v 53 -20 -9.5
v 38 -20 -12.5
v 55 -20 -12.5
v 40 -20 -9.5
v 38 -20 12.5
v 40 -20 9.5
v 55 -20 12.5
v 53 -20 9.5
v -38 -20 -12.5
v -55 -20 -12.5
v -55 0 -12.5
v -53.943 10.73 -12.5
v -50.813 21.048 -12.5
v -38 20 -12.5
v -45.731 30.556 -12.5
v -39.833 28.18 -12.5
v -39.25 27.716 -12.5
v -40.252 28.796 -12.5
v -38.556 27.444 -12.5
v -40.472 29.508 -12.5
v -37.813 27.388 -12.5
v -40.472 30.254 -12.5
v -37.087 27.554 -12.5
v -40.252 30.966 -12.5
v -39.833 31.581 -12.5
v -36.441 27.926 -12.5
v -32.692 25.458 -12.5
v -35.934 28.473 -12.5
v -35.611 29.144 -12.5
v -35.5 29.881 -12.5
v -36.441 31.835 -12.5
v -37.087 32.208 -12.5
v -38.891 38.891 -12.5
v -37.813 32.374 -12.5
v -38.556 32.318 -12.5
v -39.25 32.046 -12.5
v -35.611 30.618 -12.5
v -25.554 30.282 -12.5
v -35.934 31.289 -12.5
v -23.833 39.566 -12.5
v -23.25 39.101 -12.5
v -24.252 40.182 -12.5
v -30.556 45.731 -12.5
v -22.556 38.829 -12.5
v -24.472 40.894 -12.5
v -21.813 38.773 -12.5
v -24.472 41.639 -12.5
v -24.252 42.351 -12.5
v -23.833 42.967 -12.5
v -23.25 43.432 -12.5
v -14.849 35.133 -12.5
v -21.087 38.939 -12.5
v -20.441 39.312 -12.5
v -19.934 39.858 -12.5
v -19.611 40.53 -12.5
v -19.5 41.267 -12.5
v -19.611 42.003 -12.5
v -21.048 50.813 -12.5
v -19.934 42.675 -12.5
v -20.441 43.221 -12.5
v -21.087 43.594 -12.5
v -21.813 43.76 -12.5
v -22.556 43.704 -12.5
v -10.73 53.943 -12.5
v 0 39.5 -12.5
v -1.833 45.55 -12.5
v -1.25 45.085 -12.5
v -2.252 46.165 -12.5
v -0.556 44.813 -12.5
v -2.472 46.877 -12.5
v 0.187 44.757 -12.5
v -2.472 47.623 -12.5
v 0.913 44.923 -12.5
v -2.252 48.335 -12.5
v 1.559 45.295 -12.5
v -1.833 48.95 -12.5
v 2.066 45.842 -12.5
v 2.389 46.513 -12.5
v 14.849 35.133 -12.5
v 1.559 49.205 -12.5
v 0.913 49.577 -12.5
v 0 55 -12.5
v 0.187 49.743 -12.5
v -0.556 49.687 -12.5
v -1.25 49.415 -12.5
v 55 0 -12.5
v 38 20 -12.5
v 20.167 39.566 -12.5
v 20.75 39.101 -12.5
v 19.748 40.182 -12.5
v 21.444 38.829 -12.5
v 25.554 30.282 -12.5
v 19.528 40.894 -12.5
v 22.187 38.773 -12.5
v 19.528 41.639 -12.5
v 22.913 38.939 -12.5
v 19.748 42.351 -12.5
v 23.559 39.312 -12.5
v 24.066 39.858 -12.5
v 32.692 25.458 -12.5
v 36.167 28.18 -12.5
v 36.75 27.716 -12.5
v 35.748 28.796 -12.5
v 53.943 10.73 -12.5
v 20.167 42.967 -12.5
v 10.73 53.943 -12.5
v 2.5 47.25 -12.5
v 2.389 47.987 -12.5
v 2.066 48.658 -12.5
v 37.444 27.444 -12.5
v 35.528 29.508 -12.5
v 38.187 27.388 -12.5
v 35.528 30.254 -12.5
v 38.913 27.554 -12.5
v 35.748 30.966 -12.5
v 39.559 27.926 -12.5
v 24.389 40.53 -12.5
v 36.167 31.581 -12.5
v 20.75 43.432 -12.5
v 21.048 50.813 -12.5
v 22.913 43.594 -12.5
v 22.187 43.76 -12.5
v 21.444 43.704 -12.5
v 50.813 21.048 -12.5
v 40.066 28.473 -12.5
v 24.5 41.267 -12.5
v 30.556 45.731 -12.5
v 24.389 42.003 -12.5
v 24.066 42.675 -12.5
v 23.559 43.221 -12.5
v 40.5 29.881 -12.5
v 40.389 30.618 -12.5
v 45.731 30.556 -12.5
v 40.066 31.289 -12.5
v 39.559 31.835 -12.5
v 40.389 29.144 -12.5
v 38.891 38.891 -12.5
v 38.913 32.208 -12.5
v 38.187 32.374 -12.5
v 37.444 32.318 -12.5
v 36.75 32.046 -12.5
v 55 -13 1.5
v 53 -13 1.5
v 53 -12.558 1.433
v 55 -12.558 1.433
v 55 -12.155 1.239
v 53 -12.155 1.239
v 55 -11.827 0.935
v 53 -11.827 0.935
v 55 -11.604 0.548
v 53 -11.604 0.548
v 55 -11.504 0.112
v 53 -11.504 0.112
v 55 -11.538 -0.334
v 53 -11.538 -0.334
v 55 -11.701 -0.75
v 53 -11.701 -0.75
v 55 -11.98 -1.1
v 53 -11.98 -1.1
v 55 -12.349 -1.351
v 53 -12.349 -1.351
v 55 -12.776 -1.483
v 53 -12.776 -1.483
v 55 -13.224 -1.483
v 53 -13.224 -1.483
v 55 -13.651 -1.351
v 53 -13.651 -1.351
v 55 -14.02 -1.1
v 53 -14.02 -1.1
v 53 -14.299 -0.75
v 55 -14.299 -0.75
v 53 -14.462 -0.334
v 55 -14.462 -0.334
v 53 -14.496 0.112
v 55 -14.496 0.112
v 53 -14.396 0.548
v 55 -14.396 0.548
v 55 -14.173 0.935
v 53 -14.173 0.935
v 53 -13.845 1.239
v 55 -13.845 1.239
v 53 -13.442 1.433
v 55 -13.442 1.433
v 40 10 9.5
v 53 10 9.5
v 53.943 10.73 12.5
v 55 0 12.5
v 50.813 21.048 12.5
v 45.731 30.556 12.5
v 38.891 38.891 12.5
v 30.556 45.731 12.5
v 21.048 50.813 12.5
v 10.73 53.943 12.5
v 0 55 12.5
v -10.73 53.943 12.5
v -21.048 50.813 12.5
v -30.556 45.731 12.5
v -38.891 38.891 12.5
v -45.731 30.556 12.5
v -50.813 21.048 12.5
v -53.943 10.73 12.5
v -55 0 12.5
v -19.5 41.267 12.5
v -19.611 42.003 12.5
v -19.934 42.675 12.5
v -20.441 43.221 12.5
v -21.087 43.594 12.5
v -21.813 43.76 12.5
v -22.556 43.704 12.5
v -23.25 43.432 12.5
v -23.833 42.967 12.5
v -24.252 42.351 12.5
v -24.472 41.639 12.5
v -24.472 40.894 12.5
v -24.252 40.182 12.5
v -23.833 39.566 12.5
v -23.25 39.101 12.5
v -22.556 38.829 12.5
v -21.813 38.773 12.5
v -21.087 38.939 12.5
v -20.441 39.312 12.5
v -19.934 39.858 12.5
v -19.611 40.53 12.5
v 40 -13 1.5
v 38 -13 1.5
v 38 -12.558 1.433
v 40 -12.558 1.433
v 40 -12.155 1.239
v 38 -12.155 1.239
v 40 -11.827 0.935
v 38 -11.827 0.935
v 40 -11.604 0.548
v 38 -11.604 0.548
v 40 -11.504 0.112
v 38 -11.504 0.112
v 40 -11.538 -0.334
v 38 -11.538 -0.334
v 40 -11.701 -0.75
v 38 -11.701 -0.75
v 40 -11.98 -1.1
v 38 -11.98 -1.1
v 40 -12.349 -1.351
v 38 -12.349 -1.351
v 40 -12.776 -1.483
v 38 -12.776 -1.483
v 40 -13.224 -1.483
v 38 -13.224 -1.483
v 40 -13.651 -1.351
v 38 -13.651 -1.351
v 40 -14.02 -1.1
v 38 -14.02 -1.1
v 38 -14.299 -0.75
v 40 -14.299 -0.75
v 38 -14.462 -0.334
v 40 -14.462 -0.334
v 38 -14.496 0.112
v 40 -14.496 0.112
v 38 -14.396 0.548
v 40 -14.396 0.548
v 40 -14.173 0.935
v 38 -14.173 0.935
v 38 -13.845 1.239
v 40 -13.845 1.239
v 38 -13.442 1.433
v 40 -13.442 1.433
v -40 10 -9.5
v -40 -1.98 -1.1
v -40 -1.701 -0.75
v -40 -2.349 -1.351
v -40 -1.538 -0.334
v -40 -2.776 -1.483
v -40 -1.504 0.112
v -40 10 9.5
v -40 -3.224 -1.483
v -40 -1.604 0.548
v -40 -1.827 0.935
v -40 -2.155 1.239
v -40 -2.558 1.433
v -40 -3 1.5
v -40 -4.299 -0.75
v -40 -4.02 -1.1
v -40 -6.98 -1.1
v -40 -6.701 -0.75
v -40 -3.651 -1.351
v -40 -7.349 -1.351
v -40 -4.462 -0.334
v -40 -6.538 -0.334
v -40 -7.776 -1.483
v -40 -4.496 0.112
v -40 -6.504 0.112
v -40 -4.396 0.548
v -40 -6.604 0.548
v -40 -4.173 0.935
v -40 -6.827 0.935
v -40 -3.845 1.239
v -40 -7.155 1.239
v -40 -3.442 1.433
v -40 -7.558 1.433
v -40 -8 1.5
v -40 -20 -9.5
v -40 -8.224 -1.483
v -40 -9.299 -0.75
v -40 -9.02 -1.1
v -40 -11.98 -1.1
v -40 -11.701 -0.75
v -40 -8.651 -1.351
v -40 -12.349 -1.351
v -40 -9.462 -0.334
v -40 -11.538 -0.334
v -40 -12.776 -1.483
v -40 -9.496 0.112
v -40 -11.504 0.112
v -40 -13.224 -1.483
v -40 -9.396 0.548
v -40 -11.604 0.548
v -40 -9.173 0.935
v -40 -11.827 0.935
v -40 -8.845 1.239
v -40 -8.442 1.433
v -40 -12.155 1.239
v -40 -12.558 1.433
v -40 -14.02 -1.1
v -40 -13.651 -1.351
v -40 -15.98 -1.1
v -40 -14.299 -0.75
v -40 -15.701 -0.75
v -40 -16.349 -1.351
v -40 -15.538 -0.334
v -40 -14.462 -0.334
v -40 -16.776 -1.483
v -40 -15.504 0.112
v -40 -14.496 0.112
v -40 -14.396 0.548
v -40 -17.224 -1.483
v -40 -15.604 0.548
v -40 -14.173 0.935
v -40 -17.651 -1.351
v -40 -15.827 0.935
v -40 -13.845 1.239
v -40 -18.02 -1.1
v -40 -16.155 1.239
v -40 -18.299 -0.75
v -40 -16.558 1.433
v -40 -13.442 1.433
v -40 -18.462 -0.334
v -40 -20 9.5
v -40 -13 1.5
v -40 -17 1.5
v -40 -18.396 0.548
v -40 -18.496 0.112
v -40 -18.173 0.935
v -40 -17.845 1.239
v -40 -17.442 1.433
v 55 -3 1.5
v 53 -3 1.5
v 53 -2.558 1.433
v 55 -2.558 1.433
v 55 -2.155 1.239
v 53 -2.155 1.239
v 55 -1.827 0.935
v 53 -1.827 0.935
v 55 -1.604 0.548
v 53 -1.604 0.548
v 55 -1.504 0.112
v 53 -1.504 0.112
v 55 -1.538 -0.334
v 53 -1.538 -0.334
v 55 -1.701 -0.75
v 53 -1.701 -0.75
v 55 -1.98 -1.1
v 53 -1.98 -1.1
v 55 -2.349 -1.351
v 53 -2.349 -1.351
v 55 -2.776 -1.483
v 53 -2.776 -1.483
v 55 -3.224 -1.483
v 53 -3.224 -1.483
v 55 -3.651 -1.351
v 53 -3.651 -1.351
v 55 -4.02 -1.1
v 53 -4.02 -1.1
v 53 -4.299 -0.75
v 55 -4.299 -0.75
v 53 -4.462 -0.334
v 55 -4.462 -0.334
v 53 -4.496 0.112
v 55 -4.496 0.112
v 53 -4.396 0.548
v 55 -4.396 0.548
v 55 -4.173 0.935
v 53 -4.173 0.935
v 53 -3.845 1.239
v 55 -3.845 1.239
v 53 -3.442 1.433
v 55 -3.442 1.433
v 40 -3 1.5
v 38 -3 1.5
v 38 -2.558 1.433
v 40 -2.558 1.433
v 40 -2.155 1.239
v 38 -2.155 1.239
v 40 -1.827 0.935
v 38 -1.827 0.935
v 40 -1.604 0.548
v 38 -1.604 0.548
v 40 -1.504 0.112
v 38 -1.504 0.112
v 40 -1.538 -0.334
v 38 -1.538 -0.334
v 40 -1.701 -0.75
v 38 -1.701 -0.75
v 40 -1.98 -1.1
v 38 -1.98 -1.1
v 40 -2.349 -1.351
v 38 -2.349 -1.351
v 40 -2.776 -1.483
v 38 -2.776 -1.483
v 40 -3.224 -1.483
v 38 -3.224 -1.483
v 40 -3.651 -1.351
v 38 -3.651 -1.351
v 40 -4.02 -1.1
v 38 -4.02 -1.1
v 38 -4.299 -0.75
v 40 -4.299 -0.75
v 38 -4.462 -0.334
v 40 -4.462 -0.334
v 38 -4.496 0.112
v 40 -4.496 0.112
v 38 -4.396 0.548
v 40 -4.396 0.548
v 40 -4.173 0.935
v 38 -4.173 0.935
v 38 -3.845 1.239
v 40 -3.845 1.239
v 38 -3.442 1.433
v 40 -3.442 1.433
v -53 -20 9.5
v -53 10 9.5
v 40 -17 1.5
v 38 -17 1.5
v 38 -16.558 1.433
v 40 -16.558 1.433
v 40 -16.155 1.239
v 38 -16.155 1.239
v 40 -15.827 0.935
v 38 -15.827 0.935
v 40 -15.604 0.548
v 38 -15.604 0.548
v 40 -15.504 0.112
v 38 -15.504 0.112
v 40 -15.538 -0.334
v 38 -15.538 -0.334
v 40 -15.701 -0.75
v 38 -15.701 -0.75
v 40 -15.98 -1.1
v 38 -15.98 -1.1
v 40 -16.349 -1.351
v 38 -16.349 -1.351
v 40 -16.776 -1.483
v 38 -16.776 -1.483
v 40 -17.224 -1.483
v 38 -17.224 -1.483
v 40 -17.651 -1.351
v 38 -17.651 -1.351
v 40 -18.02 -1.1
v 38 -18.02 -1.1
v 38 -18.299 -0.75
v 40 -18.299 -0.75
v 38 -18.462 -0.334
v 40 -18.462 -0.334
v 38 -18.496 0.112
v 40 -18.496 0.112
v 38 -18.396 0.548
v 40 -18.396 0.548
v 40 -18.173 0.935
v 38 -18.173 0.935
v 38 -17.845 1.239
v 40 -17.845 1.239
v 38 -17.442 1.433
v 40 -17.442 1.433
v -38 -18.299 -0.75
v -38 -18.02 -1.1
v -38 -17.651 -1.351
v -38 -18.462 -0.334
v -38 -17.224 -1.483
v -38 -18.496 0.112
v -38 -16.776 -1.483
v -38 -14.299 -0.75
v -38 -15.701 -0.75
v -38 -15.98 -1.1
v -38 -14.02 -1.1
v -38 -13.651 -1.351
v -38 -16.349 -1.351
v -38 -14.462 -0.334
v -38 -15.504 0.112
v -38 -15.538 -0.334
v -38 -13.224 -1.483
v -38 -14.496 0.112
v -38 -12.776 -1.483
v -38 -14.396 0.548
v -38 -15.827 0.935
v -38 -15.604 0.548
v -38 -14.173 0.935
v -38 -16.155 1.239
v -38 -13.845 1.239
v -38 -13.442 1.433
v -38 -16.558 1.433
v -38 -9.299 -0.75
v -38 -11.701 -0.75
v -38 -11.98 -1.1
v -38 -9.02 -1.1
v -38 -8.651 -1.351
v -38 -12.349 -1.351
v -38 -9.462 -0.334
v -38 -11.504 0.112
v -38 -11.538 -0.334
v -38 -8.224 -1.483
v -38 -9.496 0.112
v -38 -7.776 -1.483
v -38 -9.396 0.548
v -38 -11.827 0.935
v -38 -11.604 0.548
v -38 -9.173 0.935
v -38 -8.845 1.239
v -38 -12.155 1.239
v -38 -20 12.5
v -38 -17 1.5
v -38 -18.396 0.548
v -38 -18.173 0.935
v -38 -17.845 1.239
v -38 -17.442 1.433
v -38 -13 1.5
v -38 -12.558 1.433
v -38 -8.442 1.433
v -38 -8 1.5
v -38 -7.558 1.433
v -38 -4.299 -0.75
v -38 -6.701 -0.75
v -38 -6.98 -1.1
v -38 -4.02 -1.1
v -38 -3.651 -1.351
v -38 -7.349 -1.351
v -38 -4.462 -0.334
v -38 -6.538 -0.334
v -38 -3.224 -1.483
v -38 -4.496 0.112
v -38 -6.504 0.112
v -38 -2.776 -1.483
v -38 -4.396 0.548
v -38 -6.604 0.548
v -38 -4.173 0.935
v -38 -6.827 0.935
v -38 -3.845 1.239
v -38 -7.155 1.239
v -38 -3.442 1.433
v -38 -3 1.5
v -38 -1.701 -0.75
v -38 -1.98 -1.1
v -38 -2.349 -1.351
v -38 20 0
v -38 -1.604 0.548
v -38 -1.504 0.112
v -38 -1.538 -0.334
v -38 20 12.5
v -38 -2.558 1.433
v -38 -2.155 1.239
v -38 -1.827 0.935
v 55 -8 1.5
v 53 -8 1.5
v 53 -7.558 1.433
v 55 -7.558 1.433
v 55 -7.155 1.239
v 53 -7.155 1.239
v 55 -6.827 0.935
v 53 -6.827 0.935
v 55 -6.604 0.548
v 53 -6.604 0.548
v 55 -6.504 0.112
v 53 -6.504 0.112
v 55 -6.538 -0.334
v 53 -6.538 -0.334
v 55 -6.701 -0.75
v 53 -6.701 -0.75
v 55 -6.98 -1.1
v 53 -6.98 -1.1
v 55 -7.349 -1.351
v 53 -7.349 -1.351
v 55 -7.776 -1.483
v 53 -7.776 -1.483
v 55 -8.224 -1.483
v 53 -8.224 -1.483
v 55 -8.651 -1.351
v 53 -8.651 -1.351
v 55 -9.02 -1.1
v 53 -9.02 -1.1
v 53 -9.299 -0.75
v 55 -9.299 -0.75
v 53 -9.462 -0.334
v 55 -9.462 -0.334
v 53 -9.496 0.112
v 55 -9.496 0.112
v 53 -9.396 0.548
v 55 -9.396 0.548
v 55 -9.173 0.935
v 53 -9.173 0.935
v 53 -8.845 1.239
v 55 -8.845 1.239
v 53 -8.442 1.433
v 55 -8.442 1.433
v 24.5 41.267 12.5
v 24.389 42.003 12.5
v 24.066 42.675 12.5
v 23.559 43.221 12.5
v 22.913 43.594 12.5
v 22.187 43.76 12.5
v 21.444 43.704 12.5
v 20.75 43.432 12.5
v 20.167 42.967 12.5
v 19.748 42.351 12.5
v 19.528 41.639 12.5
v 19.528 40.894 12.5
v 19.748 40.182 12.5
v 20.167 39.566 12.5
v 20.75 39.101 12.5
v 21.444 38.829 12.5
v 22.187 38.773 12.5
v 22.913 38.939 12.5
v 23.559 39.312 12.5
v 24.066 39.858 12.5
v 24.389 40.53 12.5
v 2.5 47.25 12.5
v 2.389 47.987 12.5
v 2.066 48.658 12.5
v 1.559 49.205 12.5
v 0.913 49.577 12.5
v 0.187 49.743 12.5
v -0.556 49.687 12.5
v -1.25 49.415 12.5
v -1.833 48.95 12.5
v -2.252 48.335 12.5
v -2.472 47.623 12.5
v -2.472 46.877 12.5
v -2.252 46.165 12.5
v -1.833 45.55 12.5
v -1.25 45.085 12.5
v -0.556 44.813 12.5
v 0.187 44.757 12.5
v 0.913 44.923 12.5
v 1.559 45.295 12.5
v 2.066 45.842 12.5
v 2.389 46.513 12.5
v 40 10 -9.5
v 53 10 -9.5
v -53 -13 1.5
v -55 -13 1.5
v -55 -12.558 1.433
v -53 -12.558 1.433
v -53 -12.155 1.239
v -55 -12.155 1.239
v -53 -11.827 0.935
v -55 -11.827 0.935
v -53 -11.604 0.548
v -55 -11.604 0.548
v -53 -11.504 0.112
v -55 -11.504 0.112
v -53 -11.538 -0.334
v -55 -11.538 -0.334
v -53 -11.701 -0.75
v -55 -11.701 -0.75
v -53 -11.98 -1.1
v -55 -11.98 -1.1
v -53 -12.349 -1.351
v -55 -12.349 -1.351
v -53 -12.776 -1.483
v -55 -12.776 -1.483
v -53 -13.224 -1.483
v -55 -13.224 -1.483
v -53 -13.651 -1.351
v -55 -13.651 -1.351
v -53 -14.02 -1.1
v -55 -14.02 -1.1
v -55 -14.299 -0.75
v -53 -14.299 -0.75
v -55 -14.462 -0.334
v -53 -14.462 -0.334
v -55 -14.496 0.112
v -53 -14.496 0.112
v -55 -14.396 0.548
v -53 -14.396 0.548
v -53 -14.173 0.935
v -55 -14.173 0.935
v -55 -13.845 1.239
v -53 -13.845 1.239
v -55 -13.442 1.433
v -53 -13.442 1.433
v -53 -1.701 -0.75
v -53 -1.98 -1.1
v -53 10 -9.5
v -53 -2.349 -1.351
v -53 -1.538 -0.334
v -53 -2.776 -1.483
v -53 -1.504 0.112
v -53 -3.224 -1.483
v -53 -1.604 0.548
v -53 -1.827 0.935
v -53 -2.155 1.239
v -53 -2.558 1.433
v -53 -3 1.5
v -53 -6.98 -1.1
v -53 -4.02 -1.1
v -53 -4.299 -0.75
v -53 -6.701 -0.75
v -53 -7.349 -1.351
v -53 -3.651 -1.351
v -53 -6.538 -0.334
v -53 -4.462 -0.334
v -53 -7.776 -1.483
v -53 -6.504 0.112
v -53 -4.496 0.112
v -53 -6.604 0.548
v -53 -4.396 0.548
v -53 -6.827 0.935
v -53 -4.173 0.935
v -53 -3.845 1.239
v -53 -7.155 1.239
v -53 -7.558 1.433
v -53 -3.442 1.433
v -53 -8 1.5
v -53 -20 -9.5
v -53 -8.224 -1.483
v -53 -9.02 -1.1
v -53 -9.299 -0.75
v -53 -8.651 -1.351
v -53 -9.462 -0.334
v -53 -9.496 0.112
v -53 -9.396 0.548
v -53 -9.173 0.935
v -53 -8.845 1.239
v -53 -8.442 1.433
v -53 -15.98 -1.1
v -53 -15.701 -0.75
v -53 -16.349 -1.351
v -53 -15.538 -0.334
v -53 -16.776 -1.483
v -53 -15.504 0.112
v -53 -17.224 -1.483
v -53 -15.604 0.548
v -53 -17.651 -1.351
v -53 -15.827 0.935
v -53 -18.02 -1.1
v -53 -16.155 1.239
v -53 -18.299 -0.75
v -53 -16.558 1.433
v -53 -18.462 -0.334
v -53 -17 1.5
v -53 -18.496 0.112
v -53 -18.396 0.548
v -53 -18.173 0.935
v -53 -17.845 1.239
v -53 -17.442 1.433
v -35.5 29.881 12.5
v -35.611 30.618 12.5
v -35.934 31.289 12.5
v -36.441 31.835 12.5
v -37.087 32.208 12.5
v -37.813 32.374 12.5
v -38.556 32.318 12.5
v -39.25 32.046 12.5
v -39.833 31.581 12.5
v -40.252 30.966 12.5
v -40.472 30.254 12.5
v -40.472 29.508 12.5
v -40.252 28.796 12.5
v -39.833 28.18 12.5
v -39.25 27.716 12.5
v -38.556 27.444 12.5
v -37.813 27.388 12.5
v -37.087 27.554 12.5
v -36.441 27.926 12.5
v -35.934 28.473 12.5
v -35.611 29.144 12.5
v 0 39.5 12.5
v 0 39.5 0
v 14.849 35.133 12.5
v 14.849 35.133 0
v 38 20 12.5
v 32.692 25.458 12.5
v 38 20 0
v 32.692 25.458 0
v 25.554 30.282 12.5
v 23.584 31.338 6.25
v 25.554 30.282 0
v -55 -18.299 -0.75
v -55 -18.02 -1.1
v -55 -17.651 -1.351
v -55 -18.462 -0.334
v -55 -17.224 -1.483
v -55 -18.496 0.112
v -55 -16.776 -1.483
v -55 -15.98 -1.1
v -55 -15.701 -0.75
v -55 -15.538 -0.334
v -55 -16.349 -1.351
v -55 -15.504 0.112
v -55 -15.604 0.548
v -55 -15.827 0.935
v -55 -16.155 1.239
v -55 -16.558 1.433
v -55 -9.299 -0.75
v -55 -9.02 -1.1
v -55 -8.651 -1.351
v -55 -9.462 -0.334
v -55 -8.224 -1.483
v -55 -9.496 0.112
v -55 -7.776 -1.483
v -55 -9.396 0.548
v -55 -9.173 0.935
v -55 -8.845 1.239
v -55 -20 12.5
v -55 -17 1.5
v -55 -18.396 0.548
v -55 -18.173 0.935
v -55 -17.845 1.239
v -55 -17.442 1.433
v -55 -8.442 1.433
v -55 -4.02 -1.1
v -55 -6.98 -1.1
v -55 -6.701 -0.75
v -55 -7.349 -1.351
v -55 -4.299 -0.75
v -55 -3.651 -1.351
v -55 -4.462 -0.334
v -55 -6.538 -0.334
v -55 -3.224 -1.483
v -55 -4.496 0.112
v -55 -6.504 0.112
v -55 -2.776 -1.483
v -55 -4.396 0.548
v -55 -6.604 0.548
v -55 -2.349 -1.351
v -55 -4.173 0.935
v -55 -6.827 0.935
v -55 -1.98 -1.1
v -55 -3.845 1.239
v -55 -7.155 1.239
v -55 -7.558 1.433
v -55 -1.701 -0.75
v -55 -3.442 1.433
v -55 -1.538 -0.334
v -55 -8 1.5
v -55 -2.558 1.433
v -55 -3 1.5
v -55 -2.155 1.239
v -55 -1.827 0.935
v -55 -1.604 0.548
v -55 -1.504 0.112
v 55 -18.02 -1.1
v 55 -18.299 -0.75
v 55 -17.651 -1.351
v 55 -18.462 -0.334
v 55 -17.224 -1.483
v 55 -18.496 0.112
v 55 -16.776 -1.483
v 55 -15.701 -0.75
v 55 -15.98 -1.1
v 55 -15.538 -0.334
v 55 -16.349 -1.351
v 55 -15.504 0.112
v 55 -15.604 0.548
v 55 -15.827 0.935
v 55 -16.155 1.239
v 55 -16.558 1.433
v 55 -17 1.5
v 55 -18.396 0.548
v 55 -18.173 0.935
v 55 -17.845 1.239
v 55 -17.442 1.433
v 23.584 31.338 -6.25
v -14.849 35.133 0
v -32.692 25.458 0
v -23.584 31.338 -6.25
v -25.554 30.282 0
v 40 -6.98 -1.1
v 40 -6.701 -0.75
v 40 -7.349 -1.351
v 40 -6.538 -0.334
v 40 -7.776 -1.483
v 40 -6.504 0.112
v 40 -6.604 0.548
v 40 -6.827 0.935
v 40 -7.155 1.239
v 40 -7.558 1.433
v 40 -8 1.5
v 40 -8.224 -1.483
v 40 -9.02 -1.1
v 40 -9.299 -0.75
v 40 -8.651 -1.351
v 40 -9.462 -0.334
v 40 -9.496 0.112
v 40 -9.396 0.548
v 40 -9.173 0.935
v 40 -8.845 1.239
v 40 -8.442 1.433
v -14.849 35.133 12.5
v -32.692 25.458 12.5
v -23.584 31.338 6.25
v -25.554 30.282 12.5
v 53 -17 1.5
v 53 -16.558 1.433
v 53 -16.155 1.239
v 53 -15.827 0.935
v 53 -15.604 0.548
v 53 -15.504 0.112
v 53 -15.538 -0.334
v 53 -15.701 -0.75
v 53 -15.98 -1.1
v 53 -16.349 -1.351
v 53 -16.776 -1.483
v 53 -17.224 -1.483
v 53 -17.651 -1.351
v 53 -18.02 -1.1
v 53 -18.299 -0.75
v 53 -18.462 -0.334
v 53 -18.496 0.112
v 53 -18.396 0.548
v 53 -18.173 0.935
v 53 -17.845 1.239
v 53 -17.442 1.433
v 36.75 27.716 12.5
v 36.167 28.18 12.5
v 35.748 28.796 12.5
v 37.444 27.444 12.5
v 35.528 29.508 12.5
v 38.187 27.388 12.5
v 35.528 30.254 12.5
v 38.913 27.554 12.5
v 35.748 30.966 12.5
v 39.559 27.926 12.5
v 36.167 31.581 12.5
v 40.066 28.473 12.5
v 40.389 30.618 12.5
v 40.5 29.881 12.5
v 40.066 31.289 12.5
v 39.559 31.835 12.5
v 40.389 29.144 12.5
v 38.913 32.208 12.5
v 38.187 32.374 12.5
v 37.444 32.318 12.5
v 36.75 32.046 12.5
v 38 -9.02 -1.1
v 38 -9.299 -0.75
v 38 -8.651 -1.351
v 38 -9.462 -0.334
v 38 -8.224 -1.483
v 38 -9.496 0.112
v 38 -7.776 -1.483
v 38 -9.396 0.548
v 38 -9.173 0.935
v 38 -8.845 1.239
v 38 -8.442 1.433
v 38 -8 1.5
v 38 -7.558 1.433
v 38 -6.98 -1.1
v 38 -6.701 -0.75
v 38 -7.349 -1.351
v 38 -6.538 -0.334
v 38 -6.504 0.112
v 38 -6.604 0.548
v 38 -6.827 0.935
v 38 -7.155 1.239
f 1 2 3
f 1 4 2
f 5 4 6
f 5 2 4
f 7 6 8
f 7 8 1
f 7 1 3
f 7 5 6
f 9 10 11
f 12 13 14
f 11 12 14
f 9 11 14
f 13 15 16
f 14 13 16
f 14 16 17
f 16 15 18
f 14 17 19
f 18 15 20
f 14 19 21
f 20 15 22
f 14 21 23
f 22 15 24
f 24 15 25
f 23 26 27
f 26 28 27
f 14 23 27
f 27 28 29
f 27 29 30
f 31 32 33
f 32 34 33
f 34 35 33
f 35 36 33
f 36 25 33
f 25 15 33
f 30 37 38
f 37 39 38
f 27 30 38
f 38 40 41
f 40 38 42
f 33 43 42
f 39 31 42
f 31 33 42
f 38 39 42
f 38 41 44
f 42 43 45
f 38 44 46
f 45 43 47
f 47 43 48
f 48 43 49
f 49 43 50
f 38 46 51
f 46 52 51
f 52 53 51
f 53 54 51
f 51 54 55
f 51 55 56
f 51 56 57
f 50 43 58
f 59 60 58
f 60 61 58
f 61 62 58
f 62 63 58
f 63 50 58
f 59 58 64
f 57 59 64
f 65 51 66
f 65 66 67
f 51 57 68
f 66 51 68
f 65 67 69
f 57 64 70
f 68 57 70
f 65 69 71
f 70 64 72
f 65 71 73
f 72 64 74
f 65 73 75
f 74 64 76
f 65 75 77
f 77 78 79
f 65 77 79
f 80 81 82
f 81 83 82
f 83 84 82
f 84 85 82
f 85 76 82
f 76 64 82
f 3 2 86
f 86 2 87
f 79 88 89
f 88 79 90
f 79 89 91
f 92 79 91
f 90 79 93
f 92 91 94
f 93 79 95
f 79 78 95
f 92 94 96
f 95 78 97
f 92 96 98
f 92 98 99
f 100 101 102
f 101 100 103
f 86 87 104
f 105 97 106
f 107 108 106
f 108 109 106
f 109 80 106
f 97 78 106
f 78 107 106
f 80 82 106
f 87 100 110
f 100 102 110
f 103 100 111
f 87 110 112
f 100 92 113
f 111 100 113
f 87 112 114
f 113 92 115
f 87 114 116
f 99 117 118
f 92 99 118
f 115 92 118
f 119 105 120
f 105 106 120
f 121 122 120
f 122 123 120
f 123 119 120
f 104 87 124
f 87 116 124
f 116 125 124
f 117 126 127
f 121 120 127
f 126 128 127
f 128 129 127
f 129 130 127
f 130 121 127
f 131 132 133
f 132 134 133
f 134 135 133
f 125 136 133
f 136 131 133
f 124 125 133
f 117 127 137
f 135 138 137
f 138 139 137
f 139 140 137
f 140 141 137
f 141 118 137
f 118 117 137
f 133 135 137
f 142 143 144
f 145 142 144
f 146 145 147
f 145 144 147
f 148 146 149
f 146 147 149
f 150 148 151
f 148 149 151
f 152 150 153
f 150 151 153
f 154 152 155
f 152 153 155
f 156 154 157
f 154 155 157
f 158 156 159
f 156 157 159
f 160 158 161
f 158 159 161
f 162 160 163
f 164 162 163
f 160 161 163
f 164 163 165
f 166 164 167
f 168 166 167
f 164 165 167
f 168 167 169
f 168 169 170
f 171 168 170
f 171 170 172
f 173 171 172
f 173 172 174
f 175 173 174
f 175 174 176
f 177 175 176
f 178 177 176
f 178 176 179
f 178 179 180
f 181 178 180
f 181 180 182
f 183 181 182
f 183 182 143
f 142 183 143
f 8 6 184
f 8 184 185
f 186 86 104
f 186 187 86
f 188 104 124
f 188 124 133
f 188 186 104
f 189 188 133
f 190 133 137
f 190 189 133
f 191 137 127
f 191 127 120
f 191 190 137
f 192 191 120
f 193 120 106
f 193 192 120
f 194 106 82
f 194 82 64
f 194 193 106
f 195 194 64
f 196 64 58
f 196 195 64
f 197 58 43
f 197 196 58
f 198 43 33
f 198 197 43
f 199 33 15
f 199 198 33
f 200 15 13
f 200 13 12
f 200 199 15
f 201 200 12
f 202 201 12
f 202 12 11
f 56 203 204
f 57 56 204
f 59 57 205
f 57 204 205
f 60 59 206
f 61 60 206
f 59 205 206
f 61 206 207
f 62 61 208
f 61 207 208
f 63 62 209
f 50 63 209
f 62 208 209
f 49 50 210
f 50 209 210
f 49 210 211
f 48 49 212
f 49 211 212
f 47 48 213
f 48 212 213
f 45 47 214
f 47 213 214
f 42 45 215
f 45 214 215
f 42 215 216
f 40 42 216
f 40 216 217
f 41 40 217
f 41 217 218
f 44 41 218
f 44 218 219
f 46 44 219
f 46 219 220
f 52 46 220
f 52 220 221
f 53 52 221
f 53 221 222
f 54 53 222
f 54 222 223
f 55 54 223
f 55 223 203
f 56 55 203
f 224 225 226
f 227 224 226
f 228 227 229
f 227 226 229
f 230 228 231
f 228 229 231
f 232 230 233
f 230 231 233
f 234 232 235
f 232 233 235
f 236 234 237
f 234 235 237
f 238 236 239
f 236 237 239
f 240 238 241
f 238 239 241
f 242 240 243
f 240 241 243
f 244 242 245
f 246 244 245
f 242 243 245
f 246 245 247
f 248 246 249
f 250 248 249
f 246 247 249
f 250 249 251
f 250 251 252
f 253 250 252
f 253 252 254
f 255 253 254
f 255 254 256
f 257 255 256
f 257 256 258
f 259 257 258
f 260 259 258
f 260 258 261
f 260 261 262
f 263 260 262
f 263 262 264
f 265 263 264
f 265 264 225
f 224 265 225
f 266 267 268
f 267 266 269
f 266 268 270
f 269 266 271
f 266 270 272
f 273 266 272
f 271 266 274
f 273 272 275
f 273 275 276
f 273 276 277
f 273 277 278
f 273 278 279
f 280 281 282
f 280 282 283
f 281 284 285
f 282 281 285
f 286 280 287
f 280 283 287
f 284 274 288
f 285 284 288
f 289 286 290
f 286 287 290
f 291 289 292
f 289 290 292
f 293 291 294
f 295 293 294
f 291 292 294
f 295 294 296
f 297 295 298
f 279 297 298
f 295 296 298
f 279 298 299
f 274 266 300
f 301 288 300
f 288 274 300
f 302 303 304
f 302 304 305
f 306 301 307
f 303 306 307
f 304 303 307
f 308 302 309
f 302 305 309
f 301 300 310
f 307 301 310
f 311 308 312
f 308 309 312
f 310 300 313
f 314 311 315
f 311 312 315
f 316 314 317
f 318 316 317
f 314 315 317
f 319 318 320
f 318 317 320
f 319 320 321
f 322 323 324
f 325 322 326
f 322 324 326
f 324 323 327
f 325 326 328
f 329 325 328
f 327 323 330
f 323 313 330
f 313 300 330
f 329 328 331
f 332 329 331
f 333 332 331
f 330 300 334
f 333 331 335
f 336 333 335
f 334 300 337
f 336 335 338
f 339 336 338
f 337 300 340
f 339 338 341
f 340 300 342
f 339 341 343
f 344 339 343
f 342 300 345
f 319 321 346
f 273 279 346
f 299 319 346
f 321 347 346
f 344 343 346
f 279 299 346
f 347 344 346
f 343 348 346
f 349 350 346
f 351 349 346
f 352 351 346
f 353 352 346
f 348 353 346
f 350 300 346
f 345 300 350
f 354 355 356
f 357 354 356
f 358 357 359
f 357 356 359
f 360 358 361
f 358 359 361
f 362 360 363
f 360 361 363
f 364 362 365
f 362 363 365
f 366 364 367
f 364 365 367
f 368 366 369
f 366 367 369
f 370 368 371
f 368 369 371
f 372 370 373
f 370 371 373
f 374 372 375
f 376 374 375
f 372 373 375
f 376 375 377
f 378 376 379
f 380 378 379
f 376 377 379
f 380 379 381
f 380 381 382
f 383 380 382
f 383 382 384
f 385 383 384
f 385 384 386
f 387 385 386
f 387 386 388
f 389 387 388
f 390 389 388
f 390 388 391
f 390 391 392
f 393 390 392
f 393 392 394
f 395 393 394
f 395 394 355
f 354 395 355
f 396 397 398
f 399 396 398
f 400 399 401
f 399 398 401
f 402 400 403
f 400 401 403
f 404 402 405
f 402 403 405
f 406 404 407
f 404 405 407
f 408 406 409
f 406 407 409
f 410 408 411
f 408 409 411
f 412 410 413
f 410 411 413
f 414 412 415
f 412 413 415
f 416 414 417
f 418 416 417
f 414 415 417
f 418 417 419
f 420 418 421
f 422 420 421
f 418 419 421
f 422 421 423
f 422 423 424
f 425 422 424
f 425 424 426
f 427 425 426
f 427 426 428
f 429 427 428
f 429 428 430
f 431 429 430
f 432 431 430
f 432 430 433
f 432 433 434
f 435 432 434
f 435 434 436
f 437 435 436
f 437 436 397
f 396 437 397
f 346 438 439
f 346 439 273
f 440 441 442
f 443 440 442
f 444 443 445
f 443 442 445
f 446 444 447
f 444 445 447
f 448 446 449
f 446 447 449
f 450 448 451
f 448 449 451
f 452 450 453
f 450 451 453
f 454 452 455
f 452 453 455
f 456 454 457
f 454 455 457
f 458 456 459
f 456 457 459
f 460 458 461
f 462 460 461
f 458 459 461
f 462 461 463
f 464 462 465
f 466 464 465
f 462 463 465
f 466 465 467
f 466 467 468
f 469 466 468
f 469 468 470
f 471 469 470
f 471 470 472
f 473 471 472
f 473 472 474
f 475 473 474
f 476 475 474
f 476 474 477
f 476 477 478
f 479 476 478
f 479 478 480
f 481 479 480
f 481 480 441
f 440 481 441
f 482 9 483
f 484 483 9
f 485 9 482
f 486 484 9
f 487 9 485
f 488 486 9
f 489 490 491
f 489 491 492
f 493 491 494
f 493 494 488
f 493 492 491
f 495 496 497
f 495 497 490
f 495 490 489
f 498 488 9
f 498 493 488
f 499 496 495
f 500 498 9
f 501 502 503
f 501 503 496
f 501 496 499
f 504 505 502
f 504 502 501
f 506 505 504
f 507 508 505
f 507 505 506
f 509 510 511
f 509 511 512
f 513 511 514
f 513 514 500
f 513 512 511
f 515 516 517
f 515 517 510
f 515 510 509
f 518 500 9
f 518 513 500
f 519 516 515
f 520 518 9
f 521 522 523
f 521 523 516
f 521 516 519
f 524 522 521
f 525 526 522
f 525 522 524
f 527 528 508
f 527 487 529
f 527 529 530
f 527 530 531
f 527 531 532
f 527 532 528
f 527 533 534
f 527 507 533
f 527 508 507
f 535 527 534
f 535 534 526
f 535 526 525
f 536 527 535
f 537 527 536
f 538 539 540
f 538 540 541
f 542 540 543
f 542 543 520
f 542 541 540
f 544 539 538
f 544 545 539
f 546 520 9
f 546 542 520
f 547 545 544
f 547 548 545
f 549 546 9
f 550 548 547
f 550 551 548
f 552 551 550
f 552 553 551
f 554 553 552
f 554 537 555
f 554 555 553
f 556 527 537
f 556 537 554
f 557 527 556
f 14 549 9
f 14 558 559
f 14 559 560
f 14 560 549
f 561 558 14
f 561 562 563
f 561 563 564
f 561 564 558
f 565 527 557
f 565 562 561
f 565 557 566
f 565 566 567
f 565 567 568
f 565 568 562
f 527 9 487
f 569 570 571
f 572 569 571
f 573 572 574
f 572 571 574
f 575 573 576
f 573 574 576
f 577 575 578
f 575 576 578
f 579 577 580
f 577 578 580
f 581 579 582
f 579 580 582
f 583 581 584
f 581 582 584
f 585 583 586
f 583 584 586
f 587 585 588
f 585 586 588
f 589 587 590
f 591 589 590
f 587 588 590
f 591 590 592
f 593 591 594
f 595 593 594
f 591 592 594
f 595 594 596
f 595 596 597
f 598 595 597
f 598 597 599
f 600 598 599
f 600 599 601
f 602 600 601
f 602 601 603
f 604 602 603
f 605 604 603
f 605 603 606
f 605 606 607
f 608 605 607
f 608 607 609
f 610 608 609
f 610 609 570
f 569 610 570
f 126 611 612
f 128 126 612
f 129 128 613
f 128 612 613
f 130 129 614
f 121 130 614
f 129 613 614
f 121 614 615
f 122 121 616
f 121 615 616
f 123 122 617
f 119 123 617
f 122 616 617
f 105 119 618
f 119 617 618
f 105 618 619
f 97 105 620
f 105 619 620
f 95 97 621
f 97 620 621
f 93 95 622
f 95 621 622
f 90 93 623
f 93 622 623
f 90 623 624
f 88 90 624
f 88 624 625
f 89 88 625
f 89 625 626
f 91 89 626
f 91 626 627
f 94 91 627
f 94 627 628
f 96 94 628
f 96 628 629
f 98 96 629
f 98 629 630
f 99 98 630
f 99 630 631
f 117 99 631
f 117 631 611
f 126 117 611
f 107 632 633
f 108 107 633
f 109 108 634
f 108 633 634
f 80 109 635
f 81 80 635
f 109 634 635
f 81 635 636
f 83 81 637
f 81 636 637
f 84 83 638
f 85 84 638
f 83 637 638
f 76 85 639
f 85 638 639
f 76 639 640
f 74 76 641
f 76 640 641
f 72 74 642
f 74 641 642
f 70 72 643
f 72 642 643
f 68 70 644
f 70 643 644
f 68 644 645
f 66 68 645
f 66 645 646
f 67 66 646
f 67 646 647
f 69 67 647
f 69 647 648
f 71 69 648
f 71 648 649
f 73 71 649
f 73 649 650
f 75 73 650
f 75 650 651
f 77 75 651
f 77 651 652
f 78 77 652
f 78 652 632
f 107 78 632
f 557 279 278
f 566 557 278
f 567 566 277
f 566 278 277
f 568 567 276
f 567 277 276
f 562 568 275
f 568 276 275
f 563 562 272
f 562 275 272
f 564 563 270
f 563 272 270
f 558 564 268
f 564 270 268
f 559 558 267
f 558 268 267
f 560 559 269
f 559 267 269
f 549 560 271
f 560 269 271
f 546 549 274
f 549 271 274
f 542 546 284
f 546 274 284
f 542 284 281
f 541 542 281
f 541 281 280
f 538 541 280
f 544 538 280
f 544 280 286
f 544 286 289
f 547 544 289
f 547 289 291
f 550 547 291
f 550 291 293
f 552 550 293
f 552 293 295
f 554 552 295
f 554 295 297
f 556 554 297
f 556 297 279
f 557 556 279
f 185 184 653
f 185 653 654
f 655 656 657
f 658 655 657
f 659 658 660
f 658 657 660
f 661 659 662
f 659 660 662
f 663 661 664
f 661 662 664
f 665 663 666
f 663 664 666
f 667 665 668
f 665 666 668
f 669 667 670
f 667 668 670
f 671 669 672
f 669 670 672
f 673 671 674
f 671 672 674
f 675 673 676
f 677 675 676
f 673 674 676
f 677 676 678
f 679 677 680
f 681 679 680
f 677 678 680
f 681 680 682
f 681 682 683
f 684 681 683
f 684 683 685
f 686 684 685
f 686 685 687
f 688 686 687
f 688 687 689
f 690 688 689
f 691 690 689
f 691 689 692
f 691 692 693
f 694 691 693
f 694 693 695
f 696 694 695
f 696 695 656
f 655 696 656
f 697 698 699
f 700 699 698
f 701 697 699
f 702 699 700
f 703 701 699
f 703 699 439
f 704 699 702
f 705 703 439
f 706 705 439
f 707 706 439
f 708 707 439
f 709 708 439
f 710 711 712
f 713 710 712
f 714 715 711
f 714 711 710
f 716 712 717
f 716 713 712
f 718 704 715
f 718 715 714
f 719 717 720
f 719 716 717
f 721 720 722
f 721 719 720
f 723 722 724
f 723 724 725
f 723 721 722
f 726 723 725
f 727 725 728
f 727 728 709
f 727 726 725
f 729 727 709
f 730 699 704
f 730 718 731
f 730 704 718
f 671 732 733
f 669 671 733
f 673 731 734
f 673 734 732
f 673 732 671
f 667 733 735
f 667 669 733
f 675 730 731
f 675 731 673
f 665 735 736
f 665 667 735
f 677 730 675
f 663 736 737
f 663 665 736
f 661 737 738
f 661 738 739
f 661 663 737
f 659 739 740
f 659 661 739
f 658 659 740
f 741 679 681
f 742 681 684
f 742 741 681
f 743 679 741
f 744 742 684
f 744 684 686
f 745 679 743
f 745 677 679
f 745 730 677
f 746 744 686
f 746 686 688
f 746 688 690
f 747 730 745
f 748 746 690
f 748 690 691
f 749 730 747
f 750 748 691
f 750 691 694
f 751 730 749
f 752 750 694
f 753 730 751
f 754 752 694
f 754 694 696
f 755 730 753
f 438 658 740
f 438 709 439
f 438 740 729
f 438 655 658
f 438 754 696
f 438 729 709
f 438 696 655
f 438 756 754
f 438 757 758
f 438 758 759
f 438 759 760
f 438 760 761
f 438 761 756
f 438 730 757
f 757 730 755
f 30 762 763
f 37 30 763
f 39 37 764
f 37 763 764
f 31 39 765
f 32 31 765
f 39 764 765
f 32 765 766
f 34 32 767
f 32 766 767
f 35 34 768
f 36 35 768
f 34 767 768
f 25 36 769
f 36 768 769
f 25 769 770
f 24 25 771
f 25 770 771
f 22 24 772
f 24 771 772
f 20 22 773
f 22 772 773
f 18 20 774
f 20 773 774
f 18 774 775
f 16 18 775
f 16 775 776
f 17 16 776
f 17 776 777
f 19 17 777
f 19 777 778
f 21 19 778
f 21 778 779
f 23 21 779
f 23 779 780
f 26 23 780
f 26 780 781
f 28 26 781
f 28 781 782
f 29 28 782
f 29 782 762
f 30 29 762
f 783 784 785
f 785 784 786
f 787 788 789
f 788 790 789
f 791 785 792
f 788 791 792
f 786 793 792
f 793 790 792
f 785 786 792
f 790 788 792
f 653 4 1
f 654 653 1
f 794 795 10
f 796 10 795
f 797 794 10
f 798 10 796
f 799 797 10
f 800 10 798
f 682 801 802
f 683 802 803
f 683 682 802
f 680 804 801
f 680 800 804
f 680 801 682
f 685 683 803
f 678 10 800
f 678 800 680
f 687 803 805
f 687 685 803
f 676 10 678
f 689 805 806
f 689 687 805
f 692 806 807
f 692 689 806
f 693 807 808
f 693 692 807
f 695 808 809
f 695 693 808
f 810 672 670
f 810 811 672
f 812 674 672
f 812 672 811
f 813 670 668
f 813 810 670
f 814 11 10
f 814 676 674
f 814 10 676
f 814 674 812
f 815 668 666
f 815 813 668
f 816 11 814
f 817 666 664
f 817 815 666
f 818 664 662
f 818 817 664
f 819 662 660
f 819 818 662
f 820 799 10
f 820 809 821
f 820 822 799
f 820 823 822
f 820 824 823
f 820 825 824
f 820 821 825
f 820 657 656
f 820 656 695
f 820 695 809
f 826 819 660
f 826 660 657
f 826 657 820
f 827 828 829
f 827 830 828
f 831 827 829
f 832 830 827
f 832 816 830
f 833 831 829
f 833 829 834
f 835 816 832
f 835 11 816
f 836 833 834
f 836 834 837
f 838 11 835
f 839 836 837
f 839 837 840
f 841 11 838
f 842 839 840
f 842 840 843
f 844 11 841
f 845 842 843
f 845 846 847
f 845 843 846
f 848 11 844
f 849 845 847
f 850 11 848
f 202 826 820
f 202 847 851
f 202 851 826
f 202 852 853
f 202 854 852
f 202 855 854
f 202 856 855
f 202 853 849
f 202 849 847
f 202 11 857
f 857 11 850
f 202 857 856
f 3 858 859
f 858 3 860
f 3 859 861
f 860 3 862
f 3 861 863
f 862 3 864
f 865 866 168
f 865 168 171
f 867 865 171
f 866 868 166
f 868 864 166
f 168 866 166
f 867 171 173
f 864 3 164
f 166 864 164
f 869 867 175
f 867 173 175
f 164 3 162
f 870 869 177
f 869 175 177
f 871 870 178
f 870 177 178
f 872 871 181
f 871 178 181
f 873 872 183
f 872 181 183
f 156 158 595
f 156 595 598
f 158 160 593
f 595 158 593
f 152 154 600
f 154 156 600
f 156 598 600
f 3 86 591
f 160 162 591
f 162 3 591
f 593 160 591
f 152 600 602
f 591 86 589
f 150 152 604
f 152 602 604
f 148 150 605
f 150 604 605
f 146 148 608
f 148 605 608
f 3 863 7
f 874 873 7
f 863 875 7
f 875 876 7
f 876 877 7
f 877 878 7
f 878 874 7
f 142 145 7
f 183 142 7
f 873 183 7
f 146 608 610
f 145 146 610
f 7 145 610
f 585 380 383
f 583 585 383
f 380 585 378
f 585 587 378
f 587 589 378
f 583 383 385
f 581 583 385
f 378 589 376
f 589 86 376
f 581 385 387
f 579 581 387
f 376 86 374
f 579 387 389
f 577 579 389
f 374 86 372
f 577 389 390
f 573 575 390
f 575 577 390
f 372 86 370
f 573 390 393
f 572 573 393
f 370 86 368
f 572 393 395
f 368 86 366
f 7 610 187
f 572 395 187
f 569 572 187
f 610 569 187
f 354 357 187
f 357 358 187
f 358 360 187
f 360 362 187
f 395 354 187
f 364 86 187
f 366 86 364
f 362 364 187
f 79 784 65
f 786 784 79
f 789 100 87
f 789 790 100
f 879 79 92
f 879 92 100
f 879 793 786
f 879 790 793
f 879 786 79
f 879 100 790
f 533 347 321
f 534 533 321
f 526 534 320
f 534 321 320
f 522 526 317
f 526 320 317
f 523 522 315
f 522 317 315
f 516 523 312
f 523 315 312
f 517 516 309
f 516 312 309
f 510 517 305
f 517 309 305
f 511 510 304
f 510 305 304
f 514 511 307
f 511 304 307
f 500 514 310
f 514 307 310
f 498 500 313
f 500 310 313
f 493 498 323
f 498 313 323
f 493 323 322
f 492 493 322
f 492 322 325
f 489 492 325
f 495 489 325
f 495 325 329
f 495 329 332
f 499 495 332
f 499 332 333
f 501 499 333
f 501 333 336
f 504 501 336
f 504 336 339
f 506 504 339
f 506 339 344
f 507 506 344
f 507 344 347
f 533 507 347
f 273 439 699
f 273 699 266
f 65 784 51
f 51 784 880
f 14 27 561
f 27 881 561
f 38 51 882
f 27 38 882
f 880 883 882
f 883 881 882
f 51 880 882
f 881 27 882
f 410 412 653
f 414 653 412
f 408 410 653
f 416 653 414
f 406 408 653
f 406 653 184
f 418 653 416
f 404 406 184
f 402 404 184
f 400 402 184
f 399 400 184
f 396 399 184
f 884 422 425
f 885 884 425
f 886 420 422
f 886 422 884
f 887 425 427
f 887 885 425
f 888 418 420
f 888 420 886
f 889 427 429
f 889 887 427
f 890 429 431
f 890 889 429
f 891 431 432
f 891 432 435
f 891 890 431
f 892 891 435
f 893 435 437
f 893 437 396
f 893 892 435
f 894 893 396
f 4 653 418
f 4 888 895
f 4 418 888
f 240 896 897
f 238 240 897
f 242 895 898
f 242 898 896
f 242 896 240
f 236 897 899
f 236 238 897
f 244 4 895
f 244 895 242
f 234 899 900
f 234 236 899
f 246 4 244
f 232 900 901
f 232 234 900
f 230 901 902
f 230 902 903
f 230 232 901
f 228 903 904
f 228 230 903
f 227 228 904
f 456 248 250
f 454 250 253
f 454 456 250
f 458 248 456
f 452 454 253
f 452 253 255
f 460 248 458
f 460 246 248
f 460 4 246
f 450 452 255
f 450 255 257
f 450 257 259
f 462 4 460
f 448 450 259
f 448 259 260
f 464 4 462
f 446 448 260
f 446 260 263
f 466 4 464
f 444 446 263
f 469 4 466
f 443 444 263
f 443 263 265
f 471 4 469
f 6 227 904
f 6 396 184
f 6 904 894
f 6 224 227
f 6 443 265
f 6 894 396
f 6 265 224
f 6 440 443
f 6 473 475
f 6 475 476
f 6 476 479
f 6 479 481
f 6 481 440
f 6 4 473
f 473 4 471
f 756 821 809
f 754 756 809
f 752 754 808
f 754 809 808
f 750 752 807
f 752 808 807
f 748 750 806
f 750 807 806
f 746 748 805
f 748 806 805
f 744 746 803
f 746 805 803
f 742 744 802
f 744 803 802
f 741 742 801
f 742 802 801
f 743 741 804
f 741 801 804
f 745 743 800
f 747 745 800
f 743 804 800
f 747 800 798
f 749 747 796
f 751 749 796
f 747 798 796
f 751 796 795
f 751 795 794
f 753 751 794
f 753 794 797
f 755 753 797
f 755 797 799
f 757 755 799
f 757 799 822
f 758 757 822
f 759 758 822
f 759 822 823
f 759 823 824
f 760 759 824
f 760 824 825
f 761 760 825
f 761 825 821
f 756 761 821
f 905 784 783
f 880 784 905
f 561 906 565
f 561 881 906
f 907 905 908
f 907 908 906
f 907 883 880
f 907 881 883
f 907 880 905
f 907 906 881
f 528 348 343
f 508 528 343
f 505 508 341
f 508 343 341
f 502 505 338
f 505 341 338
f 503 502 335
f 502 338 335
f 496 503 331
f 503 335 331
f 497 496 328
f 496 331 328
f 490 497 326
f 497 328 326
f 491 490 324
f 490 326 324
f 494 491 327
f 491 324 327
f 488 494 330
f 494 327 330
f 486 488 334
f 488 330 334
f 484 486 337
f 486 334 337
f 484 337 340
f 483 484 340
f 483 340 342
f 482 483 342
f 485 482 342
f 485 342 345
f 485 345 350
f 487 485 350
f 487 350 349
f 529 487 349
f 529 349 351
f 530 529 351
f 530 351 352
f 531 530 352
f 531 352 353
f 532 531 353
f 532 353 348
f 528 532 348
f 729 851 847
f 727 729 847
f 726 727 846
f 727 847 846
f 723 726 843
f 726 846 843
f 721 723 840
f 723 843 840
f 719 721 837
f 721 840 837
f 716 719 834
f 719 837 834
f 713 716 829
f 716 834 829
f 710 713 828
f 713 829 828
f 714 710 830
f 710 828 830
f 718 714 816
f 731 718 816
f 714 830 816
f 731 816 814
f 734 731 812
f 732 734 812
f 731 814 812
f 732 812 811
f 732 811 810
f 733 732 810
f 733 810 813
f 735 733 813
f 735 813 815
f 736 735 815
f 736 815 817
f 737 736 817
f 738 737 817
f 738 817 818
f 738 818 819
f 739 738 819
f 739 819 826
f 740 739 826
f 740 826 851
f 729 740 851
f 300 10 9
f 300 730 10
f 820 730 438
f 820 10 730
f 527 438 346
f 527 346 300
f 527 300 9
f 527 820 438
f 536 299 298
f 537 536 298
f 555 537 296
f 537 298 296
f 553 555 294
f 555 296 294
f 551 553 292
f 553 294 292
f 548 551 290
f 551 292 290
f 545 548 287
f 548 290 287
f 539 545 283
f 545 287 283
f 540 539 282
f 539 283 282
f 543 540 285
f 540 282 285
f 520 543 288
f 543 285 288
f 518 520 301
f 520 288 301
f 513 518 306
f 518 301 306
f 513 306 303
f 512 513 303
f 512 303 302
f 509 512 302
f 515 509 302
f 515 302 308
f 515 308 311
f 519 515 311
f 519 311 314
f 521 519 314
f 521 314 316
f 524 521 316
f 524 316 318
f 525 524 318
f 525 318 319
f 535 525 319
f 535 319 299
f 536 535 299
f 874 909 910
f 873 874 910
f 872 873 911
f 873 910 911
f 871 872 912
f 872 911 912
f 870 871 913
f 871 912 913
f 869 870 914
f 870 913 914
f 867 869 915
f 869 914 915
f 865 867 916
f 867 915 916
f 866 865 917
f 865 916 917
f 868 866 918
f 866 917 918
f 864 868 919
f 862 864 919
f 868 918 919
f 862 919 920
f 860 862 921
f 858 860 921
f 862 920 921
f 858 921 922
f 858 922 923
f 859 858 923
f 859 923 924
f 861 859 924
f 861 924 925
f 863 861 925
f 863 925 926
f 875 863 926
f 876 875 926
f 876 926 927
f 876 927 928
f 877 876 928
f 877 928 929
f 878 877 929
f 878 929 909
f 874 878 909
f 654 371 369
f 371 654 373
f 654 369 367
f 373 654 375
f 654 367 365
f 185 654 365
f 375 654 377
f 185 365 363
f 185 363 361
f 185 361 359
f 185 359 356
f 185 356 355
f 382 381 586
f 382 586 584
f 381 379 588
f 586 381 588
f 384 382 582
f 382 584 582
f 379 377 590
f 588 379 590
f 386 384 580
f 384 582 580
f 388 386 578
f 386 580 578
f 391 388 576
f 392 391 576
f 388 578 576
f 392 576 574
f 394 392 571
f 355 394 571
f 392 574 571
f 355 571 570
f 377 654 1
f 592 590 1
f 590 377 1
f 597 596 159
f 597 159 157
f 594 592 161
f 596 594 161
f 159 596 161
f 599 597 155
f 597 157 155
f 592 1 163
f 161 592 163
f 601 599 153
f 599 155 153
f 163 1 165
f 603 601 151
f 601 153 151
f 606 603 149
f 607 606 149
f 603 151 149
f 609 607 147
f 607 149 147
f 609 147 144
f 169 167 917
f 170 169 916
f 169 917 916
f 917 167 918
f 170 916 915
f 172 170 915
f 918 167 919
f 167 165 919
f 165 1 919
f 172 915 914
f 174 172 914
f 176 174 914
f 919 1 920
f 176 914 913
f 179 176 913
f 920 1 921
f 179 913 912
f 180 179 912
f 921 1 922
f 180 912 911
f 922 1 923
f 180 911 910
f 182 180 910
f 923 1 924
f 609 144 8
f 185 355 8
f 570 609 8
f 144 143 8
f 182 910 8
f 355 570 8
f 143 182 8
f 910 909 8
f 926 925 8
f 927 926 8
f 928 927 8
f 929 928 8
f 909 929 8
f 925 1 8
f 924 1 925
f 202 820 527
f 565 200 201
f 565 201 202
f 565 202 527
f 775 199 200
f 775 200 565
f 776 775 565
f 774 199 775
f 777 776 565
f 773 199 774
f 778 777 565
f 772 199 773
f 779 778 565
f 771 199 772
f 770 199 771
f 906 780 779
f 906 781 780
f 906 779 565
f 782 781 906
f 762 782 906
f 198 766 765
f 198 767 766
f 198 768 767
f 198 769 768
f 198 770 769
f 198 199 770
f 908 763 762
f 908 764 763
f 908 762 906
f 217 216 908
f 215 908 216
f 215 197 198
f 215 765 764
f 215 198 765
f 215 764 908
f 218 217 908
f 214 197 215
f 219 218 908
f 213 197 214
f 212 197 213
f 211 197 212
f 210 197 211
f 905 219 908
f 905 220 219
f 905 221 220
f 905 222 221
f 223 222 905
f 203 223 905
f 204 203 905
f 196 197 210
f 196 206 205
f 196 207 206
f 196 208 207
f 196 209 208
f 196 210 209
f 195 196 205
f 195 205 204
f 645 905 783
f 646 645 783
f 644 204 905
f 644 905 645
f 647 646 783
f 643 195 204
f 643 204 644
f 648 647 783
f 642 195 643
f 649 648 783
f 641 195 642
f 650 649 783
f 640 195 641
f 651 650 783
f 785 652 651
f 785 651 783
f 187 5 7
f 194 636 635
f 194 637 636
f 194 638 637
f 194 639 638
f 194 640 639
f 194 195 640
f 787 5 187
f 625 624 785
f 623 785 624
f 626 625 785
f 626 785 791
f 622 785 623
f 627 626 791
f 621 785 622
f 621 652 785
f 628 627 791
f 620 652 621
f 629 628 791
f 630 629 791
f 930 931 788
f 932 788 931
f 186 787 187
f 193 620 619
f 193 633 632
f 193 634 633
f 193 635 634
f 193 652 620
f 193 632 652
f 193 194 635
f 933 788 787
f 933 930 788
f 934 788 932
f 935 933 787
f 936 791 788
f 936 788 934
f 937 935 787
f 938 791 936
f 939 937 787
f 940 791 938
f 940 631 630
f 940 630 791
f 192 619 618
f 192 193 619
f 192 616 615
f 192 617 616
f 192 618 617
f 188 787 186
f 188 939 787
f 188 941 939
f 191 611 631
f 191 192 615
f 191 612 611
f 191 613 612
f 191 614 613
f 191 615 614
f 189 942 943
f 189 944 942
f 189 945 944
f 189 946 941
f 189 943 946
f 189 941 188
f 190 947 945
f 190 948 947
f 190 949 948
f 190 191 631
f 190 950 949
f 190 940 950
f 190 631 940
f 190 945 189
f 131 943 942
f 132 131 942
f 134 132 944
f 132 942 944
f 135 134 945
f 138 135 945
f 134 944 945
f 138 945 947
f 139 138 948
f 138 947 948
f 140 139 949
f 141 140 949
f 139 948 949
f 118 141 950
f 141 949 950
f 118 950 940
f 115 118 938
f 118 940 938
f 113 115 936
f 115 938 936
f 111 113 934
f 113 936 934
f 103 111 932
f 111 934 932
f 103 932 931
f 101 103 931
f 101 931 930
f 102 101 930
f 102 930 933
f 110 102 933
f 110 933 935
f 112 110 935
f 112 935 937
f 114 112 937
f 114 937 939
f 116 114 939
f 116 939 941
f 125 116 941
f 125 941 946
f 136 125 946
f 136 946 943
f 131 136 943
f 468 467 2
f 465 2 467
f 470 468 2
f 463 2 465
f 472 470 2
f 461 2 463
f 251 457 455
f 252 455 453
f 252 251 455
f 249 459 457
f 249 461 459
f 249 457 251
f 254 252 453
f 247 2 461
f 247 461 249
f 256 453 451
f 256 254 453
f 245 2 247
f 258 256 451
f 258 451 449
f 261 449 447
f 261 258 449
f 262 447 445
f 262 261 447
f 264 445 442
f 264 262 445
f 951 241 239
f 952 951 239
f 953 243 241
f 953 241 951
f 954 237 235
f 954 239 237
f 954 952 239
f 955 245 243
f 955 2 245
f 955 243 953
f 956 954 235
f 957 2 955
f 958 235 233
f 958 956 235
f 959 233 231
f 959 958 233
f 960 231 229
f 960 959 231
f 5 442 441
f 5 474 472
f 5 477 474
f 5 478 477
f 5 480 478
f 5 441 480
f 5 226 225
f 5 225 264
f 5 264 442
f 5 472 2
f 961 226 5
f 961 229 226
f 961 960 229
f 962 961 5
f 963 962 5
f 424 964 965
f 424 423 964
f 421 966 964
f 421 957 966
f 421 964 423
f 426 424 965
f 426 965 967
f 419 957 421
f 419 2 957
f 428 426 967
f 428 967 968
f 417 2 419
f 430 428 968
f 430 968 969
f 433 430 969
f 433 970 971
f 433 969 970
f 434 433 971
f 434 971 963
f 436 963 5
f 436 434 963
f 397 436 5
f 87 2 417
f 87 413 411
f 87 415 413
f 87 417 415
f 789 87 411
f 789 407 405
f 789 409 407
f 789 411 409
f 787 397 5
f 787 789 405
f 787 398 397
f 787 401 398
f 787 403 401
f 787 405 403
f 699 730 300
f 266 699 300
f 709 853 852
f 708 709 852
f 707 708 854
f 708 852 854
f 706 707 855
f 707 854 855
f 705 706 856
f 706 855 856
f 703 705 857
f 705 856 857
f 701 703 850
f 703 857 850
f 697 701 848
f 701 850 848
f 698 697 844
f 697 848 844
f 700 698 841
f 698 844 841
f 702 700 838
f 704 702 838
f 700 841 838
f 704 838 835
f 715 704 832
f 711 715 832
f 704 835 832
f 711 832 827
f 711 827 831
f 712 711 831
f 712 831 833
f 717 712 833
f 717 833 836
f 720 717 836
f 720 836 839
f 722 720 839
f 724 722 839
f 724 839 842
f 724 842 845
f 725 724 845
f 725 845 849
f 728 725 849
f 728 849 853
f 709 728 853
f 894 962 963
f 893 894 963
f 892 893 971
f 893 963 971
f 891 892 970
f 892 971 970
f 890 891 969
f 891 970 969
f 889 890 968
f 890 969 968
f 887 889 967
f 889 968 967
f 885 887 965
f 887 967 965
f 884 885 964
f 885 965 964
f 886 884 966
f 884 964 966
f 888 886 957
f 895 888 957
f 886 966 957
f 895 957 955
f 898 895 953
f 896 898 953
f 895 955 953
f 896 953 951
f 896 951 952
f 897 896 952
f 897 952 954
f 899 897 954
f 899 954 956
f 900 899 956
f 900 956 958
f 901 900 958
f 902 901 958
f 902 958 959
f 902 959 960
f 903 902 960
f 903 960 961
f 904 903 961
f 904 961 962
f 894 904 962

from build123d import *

# Parameters (mm, degrees)
BOSS_EXTRUDE2_DEPTH = 12.5
SKETCH2_W           = 17
SKETCH2_H           = 25
BOSS_EXTRUDE3_DEPTH = 20
SKETCH3_W           = 13
SKETCH3_H           = 19
CUT_EXTRUDE1_DEPTH  = 30
SKETCH4_R           = 1.5
CUT_EXTRUDE2_DEPTH  = 124.617353294
SKETCH5_R           = 2.5
CUT_EXTRUDE3_DEPTH  = 30


with BuildPart() as part:
    # Sketch1 → Boss-Extrude2 (new, symmetric)
    with BuildSketch(Plane.XY):
        with BuildLine():
            Line((-55, 0), (-38, 0))
            Line((-38, 0), (-38, 20))
            add(Edge.make_bspline(
                [(0, 39.5), (-28.167603026, 32.926551341), (-38, 20)],
                knots=[0, 0, 0, 0.331450034, 0.331450034, 0.331450034], degree=2))
            add(Edge.make_bspline(
                [(0, 39.5), (28.167603026, 32.926551341), (38, 20)],
                knots=[0, 0, 0, 0.331450034, 0.331450034, 0.331450034], degree=2))
            Line((38, 20), (38, 0))
            Line((38, 0), (55, 0))
            ThreePointArc((55, 0), (0, 55), (-55, 0))
        make_face()
    extrude(amount=BOSS_EXTRUDE2_DEPTH, both=True)

    # Sketch2 → Boss-Extrude3 (add)
    with BuildSketch(Plane.XZ):
        with Locations((46.5, 0)):
            Rectangle(SKETCH2_W, SKETCH2_H)
        with Locations((-46.5, 0)):
            Rectangle(SKETCH2_W, SKETCH2_H)
    extrude(amount=BOSS_EXTRUDE3_DEPTH)

    # Sketch3 → Cut-Extrude1 (cut)
    with BuildSketch(Plane.XZ.offset(20)):
        with Locations((-46.5, 0)):
            Rectangle(SKETCH3_W, SKETCH3_H)
        with Locations((46.5, 0)):
            Rectangle(SKETCH3_W, SKETCH3_H)
    extrude(amount=-CUT_EXTRUDE1_DEPTH, mode=Mode.SUBTRACT)

    # Sketch4 → Cut-Extrude2 (cut, through all)
    with BuildSketch(Plane.ZY.offset(55)):
        with Locations((0, -3)):
            Circle(SKETCH4_R)
        with Locations((0, -17)):
            Circle(SKETCH4_R)
        with Locations((0, -8)):
            Circle(SKETCH4_R)
        with Locations((0, -13)):
            Circle(SKETCH4_R)
    extrude(amount=-CUT_EXTRUDE2_DEPTH, mode=Mode.SUBTRACT)

    # Sketch5 → Cut-Extrude3 (cut)
    with BuildSketch(Plane.XY.offset(12.5)):
        with Locations((0, 47.25)):
            Circle(SKETCH5_R)
        with Locations((-38, 29.880895352)):
            Circle(SKETCH5_R)
        with Locations((38, 29.880895352)):
            Circle(SKETCH5_R)
        with Locations((-22, 41.266508356)):
            Circle(SKETCH5_R)
        with Locations((22, 41.266508356)):
            Circle(SKETCH5_R)
    extrude(amount=-CUT_EXTRUDE3_DEPTH, mode=Mode.SUBTRACT)


solid = part.part
